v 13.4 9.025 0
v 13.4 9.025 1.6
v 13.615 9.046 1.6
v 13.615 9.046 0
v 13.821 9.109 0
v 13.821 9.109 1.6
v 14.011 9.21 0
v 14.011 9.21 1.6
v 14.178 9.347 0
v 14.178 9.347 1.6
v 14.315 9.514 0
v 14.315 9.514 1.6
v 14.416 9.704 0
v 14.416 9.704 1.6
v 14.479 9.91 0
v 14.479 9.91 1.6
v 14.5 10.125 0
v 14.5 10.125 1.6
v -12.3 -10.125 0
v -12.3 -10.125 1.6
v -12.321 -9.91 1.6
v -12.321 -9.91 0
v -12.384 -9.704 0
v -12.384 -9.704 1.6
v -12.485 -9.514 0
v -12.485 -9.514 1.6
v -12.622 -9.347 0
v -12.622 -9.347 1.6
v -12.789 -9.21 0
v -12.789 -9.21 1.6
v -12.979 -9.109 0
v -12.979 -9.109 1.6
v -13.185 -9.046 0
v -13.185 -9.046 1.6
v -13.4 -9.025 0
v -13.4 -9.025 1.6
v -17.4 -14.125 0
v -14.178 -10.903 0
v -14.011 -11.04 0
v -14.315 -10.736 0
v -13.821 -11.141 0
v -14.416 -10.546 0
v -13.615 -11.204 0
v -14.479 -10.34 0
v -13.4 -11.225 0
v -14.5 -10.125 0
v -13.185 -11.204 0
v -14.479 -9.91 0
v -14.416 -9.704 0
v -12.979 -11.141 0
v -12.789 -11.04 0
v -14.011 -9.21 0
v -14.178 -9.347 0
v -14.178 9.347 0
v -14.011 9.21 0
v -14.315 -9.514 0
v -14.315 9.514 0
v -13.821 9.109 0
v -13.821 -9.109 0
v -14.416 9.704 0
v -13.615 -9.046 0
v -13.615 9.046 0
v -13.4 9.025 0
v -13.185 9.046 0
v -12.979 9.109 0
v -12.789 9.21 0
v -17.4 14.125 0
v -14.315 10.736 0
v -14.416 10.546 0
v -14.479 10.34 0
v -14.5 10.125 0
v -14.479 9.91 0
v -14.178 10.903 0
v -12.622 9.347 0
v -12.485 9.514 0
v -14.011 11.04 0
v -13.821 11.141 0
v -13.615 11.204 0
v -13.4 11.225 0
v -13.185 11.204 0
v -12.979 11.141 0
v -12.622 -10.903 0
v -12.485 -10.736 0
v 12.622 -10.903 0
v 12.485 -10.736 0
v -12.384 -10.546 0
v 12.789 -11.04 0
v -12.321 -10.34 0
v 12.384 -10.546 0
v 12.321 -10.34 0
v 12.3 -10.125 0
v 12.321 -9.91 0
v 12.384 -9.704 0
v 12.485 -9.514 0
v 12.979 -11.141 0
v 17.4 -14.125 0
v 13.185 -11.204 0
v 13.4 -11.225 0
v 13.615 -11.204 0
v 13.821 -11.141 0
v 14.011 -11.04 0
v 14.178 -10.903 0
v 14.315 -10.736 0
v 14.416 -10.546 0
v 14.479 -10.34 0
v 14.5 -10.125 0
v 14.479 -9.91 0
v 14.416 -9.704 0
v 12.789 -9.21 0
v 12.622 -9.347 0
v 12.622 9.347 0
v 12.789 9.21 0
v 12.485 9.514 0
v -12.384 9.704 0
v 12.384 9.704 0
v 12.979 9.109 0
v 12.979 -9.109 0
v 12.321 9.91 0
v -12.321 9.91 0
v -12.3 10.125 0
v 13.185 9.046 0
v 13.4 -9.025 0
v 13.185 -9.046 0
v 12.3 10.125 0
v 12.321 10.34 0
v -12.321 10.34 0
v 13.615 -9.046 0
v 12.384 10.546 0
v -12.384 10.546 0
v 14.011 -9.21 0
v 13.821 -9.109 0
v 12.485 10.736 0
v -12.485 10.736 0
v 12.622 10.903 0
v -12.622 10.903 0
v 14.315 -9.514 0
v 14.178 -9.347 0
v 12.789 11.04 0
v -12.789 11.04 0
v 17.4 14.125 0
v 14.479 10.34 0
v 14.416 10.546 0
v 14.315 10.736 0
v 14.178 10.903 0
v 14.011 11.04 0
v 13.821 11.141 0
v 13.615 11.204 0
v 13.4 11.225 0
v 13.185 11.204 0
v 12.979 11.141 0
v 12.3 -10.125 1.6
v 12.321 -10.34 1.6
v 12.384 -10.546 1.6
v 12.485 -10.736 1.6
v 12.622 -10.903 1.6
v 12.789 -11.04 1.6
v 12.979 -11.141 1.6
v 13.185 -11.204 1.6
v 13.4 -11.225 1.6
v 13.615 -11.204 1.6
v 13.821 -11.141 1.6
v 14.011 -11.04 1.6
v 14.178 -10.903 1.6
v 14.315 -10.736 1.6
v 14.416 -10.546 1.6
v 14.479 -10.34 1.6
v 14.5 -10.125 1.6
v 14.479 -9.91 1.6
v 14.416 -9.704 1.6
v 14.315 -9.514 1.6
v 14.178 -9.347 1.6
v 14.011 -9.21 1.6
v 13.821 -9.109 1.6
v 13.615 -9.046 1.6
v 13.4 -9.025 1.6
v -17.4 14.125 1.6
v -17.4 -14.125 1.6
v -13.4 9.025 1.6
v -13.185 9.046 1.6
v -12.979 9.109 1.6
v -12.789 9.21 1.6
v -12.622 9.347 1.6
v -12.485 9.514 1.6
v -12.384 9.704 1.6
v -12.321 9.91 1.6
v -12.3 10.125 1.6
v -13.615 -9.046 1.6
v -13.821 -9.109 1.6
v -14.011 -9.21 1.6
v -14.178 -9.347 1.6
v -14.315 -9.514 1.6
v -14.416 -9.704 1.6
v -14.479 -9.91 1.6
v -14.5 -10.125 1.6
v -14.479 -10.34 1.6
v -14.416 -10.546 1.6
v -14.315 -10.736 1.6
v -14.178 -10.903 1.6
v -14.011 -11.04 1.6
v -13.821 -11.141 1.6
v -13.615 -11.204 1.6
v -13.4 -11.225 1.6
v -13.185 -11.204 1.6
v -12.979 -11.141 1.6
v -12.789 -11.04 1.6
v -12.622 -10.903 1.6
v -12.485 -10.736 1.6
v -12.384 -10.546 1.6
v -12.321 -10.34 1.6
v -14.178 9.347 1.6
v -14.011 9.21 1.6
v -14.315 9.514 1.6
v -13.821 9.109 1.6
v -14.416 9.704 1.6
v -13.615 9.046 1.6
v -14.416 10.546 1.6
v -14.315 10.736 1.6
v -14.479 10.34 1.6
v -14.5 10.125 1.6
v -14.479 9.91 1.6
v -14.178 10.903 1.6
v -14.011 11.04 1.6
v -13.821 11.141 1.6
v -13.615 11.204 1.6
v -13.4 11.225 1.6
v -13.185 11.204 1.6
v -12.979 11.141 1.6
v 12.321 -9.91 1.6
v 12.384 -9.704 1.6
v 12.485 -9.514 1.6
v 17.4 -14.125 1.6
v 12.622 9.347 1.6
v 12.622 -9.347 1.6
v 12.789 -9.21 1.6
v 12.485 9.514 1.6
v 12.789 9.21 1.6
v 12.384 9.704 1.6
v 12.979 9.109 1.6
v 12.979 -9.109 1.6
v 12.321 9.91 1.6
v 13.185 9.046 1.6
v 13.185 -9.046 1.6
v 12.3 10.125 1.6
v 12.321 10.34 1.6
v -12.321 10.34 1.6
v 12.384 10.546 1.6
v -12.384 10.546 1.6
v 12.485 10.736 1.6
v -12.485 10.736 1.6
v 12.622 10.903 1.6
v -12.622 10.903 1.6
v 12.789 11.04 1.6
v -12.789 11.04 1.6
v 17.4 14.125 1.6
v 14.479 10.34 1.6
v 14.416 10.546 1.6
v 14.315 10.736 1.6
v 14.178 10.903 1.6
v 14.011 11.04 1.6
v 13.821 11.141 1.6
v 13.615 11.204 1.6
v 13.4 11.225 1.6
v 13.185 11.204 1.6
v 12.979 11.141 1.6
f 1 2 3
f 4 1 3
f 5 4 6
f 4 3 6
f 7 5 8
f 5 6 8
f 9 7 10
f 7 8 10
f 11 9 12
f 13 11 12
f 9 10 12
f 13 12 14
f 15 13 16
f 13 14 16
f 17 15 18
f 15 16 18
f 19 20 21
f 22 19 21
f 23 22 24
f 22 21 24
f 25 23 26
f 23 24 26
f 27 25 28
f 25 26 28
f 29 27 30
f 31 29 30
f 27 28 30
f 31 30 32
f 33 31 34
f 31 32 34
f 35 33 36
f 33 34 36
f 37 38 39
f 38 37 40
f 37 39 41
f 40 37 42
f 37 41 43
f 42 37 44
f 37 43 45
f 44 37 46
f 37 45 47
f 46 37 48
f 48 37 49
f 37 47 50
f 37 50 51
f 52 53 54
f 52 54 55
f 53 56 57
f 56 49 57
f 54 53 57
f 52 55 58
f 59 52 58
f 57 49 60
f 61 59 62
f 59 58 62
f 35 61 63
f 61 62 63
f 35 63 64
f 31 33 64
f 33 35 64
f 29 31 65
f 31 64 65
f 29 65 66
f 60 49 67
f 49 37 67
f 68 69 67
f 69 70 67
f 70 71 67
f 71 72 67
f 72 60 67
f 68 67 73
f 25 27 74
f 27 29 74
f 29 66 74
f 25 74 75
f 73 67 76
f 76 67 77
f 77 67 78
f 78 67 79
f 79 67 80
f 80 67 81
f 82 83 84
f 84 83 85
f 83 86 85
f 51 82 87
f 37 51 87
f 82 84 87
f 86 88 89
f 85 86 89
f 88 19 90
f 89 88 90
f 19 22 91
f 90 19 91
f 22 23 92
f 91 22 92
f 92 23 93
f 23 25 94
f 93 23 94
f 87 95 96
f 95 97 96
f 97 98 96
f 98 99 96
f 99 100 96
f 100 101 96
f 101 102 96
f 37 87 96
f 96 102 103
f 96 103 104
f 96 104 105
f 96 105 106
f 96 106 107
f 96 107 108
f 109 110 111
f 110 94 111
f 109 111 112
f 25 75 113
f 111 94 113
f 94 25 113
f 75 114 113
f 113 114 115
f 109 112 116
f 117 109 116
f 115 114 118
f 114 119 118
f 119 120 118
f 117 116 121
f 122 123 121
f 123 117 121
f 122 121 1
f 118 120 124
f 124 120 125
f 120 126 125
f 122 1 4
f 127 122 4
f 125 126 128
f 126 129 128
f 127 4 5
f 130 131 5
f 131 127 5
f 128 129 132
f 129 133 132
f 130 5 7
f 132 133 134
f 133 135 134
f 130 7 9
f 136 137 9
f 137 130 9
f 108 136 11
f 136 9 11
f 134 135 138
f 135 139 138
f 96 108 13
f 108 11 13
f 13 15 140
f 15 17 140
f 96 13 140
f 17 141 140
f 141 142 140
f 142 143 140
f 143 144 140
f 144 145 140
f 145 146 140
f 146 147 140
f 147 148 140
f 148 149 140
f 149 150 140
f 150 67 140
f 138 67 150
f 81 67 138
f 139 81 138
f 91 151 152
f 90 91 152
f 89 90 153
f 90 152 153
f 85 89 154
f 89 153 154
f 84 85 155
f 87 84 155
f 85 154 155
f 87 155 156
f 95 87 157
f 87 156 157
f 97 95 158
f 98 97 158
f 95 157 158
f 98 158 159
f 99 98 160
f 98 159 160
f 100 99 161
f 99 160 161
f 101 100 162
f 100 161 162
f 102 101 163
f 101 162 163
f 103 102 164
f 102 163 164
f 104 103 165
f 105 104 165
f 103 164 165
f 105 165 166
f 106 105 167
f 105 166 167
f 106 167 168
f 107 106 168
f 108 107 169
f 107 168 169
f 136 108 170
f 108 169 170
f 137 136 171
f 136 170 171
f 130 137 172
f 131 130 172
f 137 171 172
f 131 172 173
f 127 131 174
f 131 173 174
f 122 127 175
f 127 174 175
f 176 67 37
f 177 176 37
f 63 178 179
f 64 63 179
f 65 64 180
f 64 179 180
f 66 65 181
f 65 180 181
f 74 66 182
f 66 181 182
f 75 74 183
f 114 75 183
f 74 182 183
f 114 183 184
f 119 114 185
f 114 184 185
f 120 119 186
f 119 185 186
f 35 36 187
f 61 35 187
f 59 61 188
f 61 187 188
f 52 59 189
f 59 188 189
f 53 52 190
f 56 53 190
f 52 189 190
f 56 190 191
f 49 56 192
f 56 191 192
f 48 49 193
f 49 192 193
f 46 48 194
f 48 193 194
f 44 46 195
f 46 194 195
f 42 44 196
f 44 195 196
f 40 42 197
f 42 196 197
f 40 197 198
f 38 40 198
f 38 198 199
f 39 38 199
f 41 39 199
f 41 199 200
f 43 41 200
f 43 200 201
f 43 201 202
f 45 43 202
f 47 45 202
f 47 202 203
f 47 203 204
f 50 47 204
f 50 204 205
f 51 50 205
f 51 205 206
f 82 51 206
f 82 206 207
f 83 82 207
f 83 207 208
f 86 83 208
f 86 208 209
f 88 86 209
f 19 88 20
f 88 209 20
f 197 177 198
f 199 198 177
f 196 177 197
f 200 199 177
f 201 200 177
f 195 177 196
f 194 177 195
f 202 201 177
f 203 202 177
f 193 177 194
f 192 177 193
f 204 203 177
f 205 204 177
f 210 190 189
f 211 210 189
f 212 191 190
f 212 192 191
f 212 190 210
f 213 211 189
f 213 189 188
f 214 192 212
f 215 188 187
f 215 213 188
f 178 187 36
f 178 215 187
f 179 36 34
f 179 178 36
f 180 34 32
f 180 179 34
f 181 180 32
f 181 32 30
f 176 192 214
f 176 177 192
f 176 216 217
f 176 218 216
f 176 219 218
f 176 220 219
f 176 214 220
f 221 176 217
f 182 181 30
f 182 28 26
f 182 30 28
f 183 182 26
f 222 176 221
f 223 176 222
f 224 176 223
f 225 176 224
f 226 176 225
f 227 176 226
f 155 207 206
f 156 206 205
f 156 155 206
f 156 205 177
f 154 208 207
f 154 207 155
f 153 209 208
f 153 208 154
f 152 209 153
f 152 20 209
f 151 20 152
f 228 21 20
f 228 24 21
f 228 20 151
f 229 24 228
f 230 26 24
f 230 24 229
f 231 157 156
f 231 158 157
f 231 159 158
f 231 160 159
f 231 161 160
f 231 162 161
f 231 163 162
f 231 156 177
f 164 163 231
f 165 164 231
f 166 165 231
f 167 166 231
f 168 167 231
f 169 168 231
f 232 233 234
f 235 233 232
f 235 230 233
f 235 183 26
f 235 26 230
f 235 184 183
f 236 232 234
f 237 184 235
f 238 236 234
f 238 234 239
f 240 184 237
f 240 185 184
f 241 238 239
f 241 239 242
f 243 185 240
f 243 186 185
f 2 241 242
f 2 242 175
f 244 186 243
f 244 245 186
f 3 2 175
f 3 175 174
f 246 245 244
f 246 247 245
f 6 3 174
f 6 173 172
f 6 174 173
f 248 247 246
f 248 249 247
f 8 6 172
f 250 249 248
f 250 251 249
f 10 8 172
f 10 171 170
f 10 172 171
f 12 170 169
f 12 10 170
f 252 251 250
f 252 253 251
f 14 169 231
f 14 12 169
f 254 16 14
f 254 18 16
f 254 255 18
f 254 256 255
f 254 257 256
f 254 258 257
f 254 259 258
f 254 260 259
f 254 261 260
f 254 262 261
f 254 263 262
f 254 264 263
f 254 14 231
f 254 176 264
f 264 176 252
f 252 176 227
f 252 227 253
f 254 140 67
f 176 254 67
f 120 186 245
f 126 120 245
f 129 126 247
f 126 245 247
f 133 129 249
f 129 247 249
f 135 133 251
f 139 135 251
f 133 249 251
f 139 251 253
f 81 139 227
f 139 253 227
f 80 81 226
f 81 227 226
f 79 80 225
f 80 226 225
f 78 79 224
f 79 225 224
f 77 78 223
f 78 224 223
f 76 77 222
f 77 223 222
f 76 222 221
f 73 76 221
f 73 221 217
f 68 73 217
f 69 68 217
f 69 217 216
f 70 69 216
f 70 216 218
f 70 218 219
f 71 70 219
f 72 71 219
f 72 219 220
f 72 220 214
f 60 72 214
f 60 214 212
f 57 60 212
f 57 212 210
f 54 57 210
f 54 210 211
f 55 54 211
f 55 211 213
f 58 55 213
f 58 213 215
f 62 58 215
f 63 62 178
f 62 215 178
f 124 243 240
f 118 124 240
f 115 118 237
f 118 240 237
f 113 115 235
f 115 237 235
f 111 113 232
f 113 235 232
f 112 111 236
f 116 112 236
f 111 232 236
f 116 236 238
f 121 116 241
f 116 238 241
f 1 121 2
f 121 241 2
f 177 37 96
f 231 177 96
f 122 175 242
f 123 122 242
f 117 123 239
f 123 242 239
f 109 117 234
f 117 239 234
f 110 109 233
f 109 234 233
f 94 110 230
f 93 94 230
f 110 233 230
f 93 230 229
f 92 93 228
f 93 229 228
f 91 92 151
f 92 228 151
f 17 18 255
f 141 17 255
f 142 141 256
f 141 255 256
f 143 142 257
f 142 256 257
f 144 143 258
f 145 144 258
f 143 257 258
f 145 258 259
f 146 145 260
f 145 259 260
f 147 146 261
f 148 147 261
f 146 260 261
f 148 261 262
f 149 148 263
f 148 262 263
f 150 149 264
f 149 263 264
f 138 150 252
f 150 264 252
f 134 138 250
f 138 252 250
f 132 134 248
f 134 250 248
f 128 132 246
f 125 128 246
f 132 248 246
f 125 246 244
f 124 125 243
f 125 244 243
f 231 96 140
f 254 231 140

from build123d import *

# Parameters (mm, degrees)
F1_DEPTH = 1.6
F3_DEPTH = 1.601


with BuildPart() as f1:
    # F0 (on Top) → F1 (new body)
    with BuildSketch(Plane.XY):
        Polygon((17.4, -14.125), (-17.4, 14.125), (-17.4, -14.125), align=None)
        Polygon((17.4, 14.125), (-17.4, 14.125), (17.4, -14.125), align=None)
    extrude(amount=F1_DEPTH)

    # F2 (on face) → F3 (cut, through all)
    with BuildSketch(Plane.XY.offset(1.6)):
        with BuildLine():
            ThreePointArc((-12.3, 10.125), (-14.177817, 10.902817), (-13.4, 9.025))
            Line((-13.4, 9.025), (-13.4, 10.125))
            Line((-13.4, 10.125), (-12.3, 10.125))
        make_face()
        with BuildLine():
            Line((-13.4, 10.125), (-13.4, 9.025))
            ThreePointArc((-13.4, 9.025), (-12.622183, 9.347183), (-12.3, 10.125))
            Line((-12.3, 10.125), (-13.4, 10.125))
        make_face()
        with BuildLine():
            ThreePointArc((-13.4, -9.025), (-14.177817, -10.902817), (-12.3, -10.125))
            Line((-12.3, -10.125), (-13.4, -10.125))
            Line((-13.4, -10.125), (-13.4, -9.025))
        make_face()
        with BuildLine():
            Line((-13.4, -10.125), (-12.3, -10.125))
            ThreePointArc((-12.3, -10.125), (-12.622183, -9.347183), (-13.4, -9.025))
            Line((-13.4, -9.025), (-13.4, -10.125))
        make_face()
        with BuildLine():
            Line((13.4, -10.125), (12.3, -10.125))
            ThreePointArc((12.3, -10.125), (13.4, -11.225), (14.5, -10.125))
            ThreePointArc((14.5, -10.125), (14.177817, -9.347183), (13.4, -9.025))
            Line((13.4, -9.025), (13.4, -10.125))
        make_face()
        with BuildLine():
            ThreePointArc((13.4, -9.025), (12.622183, -9.347183), (12.3, -10.125))
            Line((12.3, -10.125), (13.4, -10.125))
            Line((13.4, -10.125), (13.4, -9.025))
        make_face()
        with BuildLine():
            Line((13.4, 10.125), (13.4, 9.025))
            ThreePointArc((13.4, 9.025), (14.177817, 9.347183), (14.5, 10.125))
            ThreePointArc((14.5, 10.125), (13.4, 11.225), (12.3, 10.125))
            Line((12.3, 10.125), (13.4, 10.125))
        make_face()
        with BuildLine():
            ThreePointArc((12.3, 10.125), (12.622183, 9.347183), (13.4, 9.025))
            Line((13.4, 9.025), (13.4, 10.125))
            Line((13.4, 10.125), (12.3, 10.125))
        make_face()
    extrude(amount=-F3_DEPTH, mode=Mode.SUBTRACT)


solid = f1.part
